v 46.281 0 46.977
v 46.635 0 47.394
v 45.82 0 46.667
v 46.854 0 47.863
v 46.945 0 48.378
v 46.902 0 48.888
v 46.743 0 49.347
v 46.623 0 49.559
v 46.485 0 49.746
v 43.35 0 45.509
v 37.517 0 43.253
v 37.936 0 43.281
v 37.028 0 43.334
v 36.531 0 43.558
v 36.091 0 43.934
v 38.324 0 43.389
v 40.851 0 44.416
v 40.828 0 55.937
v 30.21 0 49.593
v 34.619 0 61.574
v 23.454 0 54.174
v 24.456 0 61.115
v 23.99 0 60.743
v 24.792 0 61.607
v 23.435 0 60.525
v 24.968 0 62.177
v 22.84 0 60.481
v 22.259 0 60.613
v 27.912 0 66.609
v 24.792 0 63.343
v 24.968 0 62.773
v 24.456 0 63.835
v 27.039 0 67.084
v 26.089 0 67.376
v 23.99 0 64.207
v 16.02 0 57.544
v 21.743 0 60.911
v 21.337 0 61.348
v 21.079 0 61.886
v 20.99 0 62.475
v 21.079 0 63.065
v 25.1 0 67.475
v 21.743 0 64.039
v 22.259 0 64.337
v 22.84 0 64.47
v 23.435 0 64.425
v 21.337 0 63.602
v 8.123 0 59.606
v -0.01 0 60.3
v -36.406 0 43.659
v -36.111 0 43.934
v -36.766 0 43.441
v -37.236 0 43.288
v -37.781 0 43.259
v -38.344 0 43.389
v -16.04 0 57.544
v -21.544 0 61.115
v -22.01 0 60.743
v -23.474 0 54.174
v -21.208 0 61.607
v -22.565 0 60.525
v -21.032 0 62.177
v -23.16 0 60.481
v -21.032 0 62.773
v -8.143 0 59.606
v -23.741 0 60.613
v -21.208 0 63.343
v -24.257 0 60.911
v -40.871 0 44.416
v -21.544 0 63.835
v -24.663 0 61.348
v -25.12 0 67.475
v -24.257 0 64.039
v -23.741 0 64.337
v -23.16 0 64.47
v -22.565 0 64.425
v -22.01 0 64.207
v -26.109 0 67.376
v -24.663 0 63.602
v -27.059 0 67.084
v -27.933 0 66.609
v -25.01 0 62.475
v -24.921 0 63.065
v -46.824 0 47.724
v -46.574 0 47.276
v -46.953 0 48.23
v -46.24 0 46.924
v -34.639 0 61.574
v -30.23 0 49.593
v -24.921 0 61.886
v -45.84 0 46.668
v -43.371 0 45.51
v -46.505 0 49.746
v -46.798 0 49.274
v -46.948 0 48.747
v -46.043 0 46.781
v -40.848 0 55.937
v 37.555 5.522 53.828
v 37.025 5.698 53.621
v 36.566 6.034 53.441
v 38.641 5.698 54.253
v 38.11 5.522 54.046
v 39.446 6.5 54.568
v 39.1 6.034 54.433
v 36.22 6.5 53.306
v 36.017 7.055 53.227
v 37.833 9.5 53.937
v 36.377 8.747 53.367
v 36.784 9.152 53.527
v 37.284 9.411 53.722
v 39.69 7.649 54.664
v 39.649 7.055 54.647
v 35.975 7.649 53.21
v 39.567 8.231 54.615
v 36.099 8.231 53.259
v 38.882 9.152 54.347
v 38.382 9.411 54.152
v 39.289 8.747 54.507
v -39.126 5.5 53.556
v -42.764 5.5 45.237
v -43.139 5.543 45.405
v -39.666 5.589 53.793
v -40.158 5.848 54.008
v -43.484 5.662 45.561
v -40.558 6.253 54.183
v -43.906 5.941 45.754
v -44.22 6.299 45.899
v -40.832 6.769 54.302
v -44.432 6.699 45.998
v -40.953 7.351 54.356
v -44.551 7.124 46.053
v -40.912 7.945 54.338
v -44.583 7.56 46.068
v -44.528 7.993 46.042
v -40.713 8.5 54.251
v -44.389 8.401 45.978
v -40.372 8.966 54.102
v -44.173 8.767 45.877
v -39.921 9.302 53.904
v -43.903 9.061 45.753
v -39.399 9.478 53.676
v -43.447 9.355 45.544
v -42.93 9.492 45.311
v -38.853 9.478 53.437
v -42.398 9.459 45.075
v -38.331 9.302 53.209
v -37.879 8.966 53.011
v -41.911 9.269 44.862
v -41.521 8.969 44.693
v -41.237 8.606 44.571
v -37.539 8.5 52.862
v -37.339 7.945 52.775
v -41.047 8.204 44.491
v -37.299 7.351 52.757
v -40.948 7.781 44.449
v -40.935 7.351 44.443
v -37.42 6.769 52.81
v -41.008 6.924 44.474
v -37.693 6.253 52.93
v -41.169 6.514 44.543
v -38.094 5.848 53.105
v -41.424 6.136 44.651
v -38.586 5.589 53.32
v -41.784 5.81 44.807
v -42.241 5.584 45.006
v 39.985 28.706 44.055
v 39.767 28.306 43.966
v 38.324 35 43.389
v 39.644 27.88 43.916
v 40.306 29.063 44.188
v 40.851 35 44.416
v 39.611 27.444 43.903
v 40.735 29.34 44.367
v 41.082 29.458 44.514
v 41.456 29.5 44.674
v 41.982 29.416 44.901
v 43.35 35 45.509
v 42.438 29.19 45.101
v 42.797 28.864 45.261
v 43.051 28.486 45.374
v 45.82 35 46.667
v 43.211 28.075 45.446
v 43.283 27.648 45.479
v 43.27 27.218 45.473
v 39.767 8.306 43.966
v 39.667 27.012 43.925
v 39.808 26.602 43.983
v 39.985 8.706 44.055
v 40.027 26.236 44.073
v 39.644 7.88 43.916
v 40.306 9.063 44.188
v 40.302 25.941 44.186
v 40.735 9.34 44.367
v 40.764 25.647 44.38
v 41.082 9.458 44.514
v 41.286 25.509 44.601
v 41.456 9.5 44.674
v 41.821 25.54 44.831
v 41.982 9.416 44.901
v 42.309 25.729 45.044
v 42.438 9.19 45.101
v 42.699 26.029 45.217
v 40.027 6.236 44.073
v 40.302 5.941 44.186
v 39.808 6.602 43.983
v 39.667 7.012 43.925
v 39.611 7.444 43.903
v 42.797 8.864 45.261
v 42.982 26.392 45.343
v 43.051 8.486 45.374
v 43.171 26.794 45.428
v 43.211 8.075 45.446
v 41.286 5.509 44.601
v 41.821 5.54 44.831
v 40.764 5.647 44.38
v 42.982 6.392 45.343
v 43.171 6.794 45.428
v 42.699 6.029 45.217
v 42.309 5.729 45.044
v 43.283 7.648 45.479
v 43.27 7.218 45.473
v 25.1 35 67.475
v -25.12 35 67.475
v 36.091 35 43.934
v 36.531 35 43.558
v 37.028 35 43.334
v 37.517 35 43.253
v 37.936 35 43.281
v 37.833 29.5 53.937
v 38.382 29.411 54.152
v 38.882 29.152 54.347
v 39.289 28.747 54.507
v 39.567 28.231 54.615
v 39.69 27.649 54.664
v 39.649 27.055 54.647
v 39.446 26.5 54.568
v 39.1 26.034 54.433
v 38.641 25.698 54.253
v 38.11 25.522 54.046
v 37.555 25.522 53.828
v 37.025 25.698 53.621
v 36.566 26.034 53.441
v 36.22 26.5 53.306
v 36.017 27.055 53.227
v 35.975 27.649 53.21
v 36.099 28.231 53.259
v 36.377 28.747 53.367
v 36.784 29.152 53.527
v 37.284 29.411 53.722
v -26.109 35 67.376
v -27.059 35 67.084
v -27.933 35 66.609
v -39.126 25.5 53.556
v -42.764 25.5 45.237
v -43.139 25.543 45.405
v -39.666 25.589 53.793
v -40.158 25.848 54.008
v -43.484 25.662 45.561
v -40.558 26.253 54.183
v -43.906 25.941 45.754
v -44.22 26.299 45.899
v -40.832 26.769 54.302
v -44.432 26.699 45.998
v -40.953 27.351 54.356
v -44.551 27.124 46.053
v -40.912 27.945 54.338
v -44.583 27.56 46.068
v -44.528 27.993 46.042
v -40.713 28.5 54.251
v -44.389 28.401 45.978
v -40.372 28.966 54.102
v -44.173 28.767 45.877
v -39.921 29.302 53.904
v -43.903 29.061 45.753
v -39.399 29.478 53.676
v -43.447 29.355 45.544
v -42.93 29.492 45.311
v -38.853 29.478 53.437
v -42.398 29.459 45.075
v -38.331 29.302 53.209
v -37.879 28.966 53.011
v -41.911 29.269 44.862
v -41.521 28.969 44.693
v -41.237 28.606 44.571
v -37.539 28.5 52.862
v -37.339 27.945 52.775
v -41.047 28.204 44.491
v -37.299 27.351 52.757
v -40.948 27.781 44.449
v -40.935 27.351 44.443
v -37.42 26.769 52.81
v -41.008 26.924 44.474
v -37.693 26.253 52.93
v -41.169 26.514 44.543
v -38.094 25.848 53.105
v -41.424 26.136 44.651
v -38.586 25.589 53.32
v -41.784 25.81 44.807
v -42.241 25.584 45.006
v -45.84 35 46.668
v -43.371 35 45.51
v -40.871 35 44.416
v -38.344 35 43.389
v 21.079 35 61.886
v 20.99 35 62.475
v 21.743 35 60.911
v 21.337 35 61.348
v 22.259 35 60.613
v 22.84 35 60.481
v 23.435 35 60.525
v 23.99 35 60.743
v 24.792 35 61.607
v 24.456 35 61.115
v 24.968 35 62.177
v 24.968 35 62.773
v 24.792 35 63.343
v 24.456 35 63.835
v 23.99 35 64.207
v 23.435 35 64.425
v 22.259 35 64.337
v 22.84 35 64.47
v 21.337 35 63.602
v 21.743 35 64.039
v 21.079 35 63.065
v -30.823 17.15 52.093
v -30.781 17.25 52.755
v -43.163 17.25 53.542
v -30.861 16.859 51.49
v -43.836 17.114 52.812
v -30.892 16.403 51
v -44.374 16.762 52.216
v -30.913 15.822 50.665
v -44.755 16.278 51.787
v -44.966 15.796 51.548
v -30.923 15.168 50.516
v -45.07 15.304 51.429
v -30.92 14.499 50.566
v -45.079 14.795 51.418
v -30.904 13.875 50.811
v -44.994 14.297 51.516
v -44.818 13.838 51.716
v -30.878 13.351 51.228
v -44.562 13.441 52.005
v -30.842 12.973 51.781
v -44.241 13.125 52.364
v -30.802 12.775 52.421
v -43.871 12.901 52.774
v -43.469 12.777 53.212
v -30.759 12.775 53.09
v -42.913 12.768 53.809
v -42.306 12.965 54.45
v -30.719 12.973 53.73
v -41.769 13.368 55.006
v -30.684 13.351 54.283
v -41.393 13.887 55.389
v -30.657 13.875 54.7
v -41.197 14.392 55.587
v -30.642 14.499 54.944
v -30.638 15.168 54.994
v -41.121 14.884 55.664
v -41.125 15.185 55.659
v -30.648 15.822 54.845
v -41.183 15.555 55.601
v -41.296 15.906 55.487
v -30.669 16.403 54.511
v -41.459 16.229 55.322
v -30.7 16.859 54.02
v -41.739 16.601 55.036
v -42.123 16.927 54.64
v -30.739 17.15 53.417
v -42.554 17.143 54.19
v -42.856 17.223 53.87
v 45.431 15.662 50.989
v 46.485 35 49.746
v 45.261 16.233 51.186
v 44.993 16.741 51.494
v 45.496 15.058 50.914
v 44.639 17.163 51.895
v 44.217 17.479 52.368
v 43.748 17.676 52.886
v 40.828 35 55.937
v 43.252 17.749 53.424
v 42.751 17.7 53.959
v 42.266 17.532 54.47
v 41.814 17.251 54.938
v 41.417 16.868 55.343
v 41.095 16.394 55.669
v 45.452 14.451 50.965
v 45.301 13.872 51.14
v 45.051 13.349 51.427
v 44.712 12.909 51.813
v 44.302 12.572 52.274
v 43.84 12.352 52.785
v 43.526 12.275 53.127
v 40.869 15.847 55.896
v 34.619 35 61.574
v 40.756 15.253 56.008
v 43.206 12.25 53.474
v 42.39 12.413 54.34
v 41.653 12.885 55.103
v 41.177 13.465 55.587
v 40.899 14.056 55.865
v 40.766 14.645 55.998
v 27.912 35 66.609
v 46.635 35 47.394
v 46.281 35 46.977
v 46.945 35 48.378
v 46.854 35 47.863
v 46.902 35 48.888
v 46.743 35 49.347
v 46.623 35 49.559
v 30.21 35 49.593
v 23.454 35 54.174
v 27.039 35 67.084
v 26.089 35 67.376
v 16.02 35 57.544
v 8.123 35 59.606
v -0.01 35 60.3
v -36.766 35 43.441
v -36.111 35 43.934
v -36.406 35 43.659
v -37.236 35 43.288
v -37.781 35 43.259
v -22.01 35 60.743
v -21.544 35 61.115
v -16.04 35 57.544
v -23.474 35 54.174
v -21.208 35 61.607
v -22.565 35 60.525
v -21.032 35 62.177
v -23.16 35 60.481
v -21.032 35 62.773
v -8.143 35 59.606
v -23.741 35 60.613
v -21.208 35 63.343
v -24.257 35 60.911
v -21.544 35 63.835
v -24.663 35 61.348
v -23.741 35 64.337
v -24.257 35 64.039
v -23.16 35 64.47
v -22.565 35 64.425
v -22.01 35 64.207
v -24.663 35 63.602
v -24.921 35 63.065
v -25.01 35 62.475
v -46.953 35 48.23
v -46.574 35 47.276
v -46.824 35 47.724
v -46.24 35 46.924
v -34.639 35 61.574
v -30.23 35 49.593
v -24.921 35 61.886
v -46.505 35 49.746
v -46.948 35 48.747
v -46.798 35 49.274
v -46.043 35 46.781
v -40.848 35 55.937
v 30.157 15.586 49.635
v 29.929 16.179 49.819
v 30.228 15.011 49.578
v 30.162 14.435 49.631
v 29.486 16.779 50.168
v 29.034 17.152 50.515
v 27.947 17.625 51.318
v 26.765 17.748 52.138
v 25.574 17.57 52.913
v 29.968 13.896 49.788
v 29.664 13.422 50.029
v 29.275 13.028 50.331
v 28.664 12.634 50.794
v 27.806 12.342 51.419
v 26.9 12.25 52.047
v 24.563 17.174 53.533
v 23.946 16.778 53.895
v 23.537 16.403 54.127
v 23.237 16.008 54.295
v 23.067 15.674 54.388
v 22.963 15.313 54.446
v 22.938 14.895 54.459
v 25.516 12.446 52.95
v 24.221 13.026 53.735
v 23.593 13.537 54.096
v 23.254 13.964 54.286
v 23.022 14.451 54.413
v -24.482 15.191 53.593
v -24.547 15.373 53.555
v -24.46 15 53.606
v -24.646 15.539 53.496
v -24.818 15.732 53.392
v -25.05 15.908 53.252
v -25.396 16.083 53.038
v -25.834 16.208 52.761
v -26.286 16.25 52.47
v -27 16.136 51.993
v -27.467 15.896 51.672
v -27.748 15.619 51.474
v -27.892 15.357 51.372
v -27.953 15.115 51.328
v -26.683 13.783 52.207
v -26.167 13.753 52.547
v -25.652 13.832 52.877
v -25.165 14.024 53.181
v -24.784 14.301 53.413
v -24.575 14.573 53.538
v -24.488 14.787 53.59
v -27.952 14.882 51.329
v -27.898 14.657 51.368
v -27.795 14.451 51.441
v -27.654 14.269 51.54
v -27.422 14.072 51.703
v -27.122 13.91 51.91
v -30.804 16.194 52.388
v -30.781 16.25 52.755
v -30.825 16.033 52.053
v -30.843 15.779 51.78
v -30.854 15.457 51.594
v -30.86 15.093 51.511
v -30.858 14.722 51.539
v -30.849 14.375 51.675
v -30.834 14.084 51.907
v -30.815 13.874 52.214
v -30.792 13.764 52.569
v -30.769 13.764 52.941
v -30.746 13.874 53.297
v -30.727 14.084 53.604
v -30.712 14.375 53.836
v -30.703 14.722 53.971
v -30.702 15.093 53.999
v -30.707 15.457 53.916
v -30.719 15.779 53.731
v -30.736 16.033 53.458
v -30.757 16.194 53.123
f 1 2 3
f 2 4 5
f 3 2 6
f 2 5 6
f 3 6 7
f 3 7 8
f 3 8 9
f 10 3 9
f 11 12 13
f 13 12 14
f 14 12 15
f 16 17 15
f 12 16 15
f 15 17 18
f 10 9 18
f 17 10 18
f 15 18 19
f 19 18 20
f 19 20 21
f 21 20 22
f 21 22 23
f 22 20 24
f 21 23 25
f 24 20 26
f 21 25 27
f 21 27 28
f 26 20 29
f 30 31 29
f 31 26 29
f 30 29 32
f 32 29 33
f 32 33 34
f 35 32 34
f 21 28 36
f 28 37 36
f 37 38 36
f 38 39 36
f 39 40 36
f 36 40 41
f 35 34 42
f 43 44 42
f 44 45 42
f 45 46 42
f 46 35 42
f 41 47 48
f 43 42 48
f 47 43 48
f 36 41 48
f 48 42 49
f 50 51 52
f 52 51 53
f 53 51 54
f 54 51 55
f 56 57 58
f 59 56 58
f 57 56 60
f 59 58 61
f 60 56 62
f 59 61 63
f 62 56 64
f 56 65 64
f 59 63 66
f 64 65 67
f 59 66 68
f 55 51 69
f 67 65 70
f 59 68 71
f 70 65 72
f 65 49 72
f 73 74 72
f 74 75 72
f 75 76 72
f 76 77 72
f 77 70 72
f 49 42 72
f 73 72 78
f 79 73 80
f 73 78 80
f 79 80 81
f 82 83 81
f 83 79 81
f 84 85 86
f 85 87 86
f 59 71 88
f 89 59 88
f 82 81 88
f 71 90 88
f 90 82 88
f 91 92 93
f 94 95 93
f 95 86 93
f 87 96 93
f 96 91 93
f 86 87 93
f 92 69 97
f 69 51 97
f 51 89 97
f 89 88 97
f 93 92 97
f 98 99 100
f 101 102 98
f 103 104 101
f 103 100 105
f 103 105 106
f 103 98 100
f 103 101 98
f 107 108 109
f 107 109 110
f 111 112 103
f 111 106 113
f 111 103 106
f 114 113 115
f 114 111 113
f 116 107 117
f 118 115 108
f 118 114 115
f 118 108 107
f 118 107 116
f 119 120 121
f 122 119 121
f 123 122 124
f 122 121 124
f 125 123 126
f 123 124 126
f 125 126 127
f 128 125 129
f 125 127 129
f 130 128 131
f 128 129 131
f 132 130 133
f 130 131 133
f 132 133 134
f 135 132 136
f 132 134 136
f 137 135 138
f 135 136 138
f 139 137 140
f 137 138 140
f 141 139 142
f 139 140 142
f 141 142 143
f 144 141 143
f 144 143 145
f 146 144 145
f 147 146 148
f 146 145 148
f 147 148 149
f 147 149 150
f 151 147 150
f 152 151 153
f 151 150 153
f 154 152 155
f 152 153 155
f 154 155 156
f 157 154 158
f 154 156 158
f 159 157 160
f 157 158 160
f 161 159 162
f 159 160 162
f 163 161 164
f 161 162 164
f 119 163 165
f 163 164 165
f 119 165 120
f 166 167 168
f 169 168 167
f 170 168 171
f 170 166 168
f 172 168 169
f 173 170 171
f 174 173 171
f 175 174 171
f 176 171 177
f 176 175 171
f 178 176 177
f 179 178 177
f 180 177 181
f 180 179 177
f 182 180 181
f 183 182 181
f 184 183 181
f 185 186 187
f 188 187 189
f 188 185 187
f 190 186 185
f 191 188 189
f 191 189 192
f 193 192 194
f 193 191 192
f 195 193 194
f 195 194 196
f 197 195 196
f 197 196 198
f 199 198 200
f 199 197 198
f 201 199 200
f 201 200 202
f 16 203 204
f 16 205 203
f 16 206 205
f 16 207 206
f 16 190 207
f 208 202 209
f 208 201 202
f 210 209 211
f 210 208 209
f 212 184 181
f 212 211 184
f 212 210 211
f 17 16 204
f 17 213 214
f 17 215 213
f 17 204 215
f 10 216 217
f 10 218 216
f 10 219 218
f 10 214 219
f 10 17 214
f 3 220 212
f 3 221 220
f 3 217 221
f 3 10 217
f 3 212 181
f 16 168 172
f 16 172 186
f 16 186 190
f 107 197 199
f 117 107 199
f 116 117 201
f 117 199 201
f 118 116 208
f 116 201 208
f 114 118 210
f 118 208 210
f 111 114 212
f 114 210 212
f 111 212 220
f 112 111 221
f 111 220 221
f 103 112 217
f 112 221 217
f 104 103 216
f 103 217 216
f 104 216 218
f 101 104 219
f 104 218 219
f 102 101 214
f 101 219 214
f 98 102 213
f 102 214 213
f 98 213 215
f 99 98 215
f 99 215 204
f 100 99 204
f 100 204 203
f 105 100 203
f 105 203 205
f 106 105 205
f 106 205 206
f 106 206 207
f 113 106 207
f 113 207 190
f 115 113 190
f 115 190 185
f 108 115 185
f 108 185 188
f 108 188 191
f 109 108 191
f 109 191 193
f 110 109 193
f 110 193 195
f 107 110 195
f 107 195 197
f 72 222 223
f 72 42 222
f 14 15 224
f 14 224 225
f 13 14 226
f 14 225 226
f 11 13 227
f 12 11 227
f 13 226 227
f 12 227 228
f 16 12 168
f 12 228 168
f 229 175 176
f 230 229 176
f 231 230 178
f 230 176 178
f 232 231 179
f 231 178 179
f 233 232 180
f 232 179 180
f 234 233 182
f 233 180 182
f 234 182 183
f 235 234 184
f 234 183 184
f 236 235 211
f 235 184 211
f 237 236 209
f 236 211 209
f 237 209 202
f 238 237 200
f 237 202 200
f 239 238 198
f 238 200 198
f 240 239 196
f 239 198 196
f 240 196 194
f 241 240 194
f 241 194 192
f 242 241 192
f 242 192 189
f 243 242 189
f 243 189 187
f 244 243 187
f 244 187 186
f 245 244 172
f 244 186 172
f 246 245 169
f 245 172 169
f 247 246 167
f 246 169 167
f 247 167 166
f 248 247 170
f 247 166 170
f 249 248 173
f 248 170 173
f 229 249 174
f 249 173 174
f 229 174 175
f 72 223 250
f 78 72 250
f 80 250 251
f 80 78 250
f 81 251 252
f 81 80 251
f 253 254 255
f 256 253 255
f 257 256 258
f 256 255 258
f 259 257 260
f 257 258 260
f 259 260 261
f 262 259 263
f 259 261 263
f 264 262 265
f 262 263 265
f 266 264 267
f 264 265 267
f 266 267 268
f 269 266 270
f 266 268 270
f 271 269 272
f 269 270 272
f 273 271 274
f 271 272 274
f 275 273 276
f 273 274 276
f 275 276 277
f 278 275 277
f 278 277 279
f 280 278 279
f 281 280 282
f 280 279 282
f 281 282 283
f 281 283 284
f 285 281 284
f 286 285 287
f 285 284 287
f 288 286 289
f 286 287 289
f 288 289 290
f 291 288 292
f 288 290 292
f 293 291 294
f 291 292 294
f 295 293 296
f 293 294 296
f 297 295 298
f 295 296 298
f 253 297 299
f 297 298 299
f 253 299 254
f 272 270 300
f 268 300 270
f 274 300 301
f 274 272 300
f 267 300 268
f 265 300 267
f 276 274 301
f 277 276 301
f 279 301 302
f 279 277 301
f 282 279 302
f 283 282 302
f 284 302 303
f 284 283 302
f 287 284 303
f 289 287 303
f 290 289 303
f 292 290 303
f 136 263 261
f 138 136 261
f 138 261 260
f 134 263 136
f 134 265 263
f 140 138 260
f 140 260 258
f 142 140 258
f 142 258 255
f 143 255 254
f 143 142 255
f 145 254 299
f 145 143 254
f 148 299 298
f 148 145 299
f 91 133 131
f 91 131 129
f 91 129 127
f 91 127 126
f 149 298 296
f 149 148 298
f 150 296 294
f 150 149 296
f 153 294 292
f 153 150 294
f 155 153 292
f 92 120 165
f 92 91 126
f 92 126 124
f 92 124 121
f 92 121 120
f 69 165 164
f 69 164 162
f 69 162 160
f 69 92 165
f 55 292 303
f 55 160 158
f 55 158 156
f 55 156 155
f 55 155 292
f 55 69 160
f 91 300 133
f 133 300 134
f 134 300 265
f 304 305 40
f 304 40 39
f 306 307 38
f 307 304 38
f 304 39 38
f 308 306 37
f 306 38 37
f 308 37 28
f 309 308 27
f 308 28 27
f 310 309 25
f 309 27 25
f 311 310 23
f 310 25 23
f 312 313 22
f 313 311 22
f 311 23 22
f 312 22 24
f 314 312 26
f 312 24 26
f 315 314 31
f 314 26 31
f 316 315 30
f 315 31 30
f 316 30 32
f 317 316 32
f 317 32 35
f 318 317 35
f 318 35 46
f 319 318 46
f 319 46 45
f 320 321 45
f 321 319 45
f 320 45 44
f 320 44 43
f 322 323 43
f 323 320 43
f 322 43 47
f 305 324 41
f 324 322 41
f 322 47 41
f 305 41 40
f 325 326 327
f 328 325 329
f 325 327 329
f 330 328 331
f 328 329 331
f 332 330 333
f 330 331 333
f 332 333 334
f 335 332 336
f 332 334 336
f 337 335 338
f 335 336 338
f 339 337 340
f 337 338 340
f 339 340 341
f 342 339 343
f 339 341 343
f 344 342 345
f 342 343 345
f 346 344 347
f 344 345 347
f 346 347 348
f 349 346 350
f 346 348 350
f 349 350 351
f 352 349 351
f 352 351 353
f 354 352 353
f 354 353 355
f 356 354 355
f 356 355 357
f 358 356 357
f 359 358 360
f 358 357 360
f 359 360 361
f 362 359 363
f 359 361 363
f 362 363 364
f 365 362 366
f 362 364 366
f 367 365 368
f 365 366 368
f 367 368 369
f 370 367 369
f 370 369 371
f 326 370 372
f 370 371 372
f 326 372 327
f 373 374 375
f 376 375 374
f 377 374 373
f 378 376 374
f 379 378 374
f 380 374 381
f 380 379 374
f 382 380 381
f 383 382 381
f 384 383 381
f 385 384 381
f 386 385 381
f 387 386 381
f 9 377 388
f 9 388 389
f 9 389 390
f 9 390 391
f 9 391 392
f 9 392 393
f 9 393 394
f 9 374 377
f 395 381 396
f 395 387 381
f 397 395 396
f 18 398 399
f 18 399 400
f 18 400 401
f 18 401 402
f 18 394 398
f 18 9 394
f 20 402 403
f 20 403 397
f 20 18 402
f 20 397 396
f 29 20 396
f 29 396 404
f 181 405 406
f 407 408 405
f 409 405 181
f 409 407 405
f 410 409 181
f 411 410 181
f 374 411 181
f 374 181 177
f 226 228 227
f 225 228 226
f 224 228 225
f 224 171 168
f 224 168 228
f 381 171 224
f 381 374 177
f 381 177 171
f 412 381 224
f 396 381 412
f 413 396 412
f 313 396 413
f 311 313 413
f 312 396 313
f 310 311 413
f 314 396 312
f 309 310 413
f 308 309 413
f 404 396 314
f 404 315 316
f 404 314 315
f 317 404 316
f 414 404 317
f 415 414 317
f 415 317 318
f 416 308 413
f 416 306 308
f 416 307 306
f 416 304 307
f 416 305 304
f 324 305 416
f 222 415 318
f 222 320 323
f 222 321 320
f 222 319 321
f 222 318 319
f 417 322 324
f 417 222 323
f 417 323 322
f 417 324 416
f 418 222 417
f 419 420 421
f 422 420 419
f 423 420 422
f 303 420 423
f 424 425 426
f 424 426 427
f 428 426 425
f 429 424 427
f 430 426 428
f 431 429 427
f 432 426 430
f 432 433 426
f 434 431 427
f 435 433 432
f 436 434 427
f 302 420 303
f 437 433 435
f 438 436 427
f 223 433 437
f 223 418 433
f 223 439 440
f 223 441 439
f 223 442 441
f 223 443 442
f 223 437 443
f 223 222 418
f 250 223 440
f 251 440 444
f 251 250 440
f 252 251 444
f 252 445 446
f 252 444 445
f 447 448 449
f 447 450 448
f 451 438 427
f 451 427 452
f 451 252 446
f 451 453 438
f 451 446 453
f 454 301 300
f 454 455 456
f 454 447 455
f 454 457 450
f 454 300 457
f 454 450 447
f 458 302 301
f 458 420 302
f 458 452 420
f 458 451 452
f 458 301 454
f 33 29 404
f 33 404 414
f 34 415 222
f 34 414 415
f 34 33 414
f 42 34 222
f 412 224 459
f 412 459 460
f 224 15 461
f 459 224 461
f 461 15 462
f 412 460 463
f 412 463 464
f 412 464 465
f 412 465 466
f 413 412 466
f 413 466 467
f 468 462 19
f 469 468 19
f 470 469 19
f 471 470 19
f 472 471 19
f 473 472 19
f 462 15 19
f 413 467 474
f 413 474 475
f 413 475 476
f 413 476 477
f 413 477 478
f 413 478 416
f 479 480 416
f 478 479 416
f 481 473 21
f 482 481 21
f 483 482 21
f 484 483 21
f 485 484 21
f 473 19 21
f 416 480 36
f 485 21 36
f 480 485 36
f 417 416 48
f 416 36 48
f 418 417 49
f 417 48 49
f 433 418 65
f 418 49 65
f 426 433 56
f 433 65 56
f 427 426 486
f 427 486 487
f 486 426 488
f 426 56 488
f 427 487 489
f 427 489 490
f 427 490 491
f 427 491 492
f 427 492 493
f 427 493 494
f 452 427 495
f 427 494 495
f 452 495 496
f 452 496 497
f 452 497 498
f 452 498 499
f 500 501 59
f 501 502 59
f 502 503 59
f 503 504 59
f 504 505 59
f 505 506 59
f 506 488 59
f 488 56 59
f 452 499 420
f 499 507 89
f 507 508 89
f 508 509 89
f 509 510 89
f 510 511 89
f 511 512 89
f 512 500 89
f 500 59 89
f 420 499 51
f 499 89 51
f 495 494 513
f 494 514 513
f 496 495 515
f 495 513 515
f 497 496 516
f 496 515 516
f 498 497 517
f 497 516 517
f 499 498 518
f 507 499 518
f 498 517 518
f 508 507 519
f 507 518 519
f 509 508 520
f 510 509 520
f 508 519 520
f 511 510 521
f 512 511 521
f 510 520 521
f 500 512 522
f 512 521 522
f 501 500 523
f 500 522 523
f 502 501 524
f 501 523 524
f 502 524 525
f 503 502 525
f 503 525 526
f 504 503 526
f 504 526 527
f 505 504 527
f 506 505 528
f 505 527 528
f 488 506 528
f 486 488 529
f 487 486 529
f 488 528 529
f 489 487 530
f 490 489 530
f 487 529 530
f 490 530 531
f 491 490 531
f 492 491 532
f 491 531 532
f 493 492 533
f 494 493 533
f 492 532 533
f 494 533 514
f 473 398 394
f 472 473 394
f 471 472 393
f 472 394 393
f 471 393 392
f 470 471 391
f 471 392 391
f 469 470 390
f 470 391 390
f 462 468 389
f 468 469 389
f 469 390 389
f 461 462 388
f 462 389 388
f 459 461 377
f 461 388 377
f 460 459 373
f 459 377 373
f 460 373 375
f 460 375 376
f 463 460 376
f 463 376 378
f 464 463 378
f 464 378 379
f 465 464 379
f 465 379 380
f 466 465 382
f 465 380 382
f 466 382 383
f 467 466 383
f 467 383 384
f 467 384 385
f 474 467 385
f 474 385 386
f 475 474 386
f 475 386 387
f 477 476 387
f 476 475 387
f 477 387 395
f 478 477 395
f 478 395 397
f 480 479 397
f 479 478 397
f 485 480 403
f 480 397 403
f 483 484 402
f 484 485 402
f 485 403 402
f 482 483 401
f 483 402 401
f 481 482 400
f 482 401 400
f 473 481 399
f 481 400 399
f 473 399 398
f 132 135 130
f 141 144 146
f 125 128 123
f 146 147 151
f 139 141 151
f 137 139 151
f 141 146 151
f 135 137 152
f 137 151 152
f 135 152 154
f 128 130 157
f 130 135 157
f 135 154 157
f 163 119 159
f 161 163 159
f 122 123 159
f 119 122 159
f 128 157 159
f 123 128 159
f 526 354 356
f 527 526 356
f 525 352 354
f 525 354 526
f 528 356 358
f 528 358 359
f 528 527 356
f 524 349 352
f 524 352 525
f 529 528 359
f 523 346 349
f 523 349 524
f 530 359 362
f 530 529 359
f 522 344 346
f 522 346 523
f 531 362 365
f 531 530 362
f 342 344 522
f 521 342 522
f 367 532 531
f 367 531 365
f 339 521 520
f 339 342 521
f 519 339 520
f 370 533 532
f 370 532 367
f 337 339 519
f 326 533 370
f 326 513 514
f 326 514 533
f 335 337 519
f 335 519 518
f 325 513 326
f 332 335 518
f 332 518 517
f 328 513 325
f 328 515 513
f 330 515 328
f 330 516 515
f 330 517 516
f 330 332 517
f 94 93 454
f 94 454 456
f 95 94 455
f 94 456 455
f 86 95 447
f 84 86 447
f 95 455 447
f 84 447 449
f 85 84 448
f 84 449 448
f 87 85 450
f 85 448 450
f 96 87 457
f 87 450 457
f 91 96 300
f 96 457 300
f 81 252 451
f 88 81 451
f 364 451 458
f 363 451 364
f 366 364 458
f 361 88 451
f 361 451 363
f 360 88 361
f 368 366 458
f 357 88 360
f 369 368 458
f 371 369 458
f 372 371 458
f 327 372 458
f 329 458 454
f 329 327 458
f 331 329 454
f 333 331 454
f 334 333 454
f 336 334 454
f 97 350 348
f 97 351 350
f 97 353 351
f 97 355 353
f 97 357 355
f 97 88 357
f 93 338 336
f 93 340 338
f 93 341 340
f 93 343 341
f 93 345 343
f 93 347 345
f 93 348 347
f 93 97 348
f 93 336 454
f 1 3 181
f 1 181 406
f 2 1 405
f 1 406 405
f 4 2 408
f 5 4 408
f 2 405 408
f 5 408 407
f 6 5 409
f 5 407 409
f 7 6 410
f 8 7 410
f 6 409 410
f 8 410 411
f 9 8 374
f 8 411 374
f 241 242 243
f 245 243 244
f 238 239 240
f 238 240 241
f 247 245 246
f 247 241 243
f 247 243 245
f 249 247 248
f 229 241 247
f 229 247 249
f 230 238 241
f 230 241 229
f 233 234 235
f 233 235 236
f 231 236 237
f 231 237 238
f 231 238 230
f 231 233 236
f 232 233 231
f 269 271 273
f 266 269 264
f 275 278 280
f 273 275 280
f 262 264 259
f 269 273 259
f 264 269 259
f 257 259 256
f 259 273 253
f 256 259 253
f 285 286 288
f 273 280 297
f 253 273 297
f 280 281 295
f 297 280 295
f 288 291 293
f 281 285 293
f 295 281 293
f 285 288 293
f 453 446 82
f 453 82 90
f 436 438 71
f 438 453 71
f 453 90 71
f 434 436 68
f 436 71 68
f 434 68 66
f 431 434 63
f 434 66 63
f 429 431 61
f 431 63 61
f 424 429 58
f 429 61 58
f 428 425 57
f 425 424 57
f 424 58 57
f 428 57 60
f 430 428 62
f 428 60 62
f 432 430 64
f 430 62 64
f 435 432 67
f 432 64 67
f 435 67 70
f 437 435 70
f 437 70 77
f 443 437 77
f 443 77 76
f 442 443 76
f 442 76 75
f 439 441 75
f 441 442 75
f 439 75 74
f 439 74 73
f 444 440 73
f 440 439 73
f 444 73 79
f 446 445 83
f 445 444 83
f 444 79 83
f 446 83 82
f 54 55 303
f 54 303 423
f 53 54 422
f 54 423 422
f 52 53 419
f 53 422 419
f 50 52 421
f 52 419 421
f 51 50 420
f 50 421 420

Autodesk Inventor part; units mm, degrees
sketch "Эскиз1" plane through (0, 0, 0) normal (0, 1, 0) x (-1, 0, 0)
  line L0 (-25.0999, 67.4751) -> (25.1202, 67.4751)
  arc A0 (37.0101, 42.8778) -> (-36.9899, 42.8778) centre (0.0101, 12.3) ccw
  arc A1 (36.6633, -21.4663) -> (-36.0003, -21.4663) centre (0.3315, -28.4663) ccw
  line L1 (36.6633, -21.4663) -> (-36.0003, -21.4663)
  circle A2 centre (23.0101, 62.4751) radius 2
  arc A3 (37.0101, 42.8778) -> (48.0857, 47.7907) centre (0.4498, 140.2397) ccw
  circle A4 centre (-22.9899, 62.4751) radius 2
  arc A5 (-48.0655, 47.7901) -> (-36.9899, 42.8778) centre (-0.4338, 140.2412) ccw
  arc A6 (-27.9123, 66.6091) -> (-48.0655, 47.7901) centre (22.7111, -7.8037) ccw
  arc A7 (48.0857, 47.7907) -> (27.9326, 66.6092) centre (-22.6902, -7.8041) ccw
  arc A8 (27.9326, 66.6092) -> (25.1202, 67.4751) centre (25.1202, 62.4751) ccw
  arc A9 (-25.0999, 67.4751) -> (-27.9123, 66.6091) centre (-25.0999, 62.4751) ccw
  line L2 (37.0101, 42.8778) -> (-36.9899, 42.8778)
  point P0 (0, 0)
  point P1 (0, 0)
  point P2 (-26.6154, 67.4751)
  point P3 (0.0101, 60.3)
  point P4 (0.0102, 67.4751)
  point P5 (0, 0)
  point P6 (26.6357, 67.4751)
  point P7 (-26.5712, 67.2537)
  point P8 (26.5916, 67.2537)
  dimension "d0" = 72.6636
  dimension "d1" = 37
  dimension "d2" = 11.0756
  dimension "d3" = 7.1751
  dimension "d4" = 5
  dimension "d5" = 5
  dimension "d6" = 90
  dimension "d7" = 90
  dimension "d8" = 5
  dimension "d95" = 23
  dimension "d96" = 23
  dimension "d97" = 48
  dimension "d98" = 11.0756
  dimension "d105" = 74
  dimension "d107" = 4
  dimension "d108" = 4
extrude "Выдавливание1" add sketch "Эскиз1" along normal blind 35 contours L0 A8 A7 A3 A0 A5 A6 A9
fillet "Сопряжение2" radius 2 4 edges at (48.0655, 17.5, 47.7901) (36.9899, 17.5, 42.8778) (-37.0101, 17.5, 42.8778) (-48.0857, 17.5, 47.7907)
ref_plane "РабПлоскость4" through (38.3242, 0, 43.3892) normal (0.3643, 0, -0.9313) x (0, 1, 0)
sketch "Эскиз9" plane through (38.3242, 0, 43.3892) normal (0.3643, 0, -0.9313) x (0, 1, 0)
  circle A0 centre (27.5, 3.3848) radius 2
  circle A1 centre (7.5, 3.3848) radius 2
  line L0 (35, 0) -> (35, 8.1748) projected
  line L1 (0, 8.1748) -> (35, 8.1748) projected
  point P0 (0, -51.4982)
  dimension "d49" = 4
  dimension "d50" = 4
  dimension "d51" = 20
  dimension "d52" = 7.5
  dimension "d53" = 4.79
  dimension "d54" = 4.79
extrude "Выдавливание6" cut sketch "Эскиз9" against normal blind 10
ref_plane "РабПлоскость9" through (-46.2409, 0, 45.7515) normal (0.4007, 0, 0.9162) x (0, -1, 0)
ref_plane "РабПлоскость8" through (-45.8402, 0, 46.6678) normal (0.4007, 0, 0.9162) x (0, -1, 0)
sketch "Эскиз12" plane through (-46.2409, 0, 45.7515) normal (0.4007, 0, 0.9162) x (0, -1, 0)
  circle A0 centre (-27.5, 3.3914) radius 2
  circle A1 centre (-7.5, 3.3914) radius 2
  line L0 (0, 8.1814) -> (-35, 8.1814) projected
  line L1 (-35, 8.1814) -> (-35, 0) projected
  point P0 (0, 60.6995)
  dimension "d66" = 4
  dimension "d67" = 4
  dimension "d68" = 20
  dimension "d69" = 4.79
  dimension "d70" = 4.79
  dimension "d71" = 7.5
extrude "Выдавливание8" cut sketch "Эскиз12" along normal blind 10
ref_plane "РабПлоскость12" through (46.4848, 0, 49.7456) normal (-0.9962, 0, -0.0872) x (0, -1, 0)
sketch "Эскиз14" plane through (46.4848, 0, 49.7456) normal (-0.9962, 0, -0.0872) x (0, -1, 0)
  circle A0 centre (-15, 4) radius 2.75
  line L0 (0, 18.418) -> (0, 0) projected
  line L1 (-35, 0) -> (0, 0) projected
  point P0 (0, -45.5049)
  dimension "d78" = 5.5
  dimension "d79" = 15
  dimension "d80" = 4
extrude "Выдавливание9" cut sketch "Эскиз14" along normal blind 43.25
ref_plane "РабПлоскость13" through (-46.505, 0, 49.7461) normal (-0.998, 0, 0.0634) x (0, 1, 0)
sketch "Эскиз16" plane through (-46.505, 0, 49.7461) normal (-0.998, 0, 0.0634) x (0, 1, 0)
  circle A0 centre (15, -4) radius 2.25
  line L0 (0, -18.0062) -> (0, 0) projected
  line L1 (0, 0) -> (35, 0) projected
  point P0 (0, 46.6988)
  dimension "d85" = 4.5
  dimension "d86" = 15
  dimension "d87" = 4
extrude "Выдавливание10" cut sketch "Эскиз16" against normal blind 15.5
sketch "Эскиз17" plane through (-46.505, 0, 49.7461) normal (-0.998, 0, 0.0634) x (0, 1, 0)
  circle A0 centre (15, -4) radius 1.25
  line L0 (0, -18.0062) -> (0, 0) projected
  line L1 (0, 0) -> (35, 0) projected
  point P0 (0, 46.6988)
  dimension "d90" = 2.5
  dimension "d91" = 15
  dimension "d92" = 4
extrude "Выдавливание11" cut sketch "Эскиз17" against normal blind 31.25
properties part number "dribler_ball"
